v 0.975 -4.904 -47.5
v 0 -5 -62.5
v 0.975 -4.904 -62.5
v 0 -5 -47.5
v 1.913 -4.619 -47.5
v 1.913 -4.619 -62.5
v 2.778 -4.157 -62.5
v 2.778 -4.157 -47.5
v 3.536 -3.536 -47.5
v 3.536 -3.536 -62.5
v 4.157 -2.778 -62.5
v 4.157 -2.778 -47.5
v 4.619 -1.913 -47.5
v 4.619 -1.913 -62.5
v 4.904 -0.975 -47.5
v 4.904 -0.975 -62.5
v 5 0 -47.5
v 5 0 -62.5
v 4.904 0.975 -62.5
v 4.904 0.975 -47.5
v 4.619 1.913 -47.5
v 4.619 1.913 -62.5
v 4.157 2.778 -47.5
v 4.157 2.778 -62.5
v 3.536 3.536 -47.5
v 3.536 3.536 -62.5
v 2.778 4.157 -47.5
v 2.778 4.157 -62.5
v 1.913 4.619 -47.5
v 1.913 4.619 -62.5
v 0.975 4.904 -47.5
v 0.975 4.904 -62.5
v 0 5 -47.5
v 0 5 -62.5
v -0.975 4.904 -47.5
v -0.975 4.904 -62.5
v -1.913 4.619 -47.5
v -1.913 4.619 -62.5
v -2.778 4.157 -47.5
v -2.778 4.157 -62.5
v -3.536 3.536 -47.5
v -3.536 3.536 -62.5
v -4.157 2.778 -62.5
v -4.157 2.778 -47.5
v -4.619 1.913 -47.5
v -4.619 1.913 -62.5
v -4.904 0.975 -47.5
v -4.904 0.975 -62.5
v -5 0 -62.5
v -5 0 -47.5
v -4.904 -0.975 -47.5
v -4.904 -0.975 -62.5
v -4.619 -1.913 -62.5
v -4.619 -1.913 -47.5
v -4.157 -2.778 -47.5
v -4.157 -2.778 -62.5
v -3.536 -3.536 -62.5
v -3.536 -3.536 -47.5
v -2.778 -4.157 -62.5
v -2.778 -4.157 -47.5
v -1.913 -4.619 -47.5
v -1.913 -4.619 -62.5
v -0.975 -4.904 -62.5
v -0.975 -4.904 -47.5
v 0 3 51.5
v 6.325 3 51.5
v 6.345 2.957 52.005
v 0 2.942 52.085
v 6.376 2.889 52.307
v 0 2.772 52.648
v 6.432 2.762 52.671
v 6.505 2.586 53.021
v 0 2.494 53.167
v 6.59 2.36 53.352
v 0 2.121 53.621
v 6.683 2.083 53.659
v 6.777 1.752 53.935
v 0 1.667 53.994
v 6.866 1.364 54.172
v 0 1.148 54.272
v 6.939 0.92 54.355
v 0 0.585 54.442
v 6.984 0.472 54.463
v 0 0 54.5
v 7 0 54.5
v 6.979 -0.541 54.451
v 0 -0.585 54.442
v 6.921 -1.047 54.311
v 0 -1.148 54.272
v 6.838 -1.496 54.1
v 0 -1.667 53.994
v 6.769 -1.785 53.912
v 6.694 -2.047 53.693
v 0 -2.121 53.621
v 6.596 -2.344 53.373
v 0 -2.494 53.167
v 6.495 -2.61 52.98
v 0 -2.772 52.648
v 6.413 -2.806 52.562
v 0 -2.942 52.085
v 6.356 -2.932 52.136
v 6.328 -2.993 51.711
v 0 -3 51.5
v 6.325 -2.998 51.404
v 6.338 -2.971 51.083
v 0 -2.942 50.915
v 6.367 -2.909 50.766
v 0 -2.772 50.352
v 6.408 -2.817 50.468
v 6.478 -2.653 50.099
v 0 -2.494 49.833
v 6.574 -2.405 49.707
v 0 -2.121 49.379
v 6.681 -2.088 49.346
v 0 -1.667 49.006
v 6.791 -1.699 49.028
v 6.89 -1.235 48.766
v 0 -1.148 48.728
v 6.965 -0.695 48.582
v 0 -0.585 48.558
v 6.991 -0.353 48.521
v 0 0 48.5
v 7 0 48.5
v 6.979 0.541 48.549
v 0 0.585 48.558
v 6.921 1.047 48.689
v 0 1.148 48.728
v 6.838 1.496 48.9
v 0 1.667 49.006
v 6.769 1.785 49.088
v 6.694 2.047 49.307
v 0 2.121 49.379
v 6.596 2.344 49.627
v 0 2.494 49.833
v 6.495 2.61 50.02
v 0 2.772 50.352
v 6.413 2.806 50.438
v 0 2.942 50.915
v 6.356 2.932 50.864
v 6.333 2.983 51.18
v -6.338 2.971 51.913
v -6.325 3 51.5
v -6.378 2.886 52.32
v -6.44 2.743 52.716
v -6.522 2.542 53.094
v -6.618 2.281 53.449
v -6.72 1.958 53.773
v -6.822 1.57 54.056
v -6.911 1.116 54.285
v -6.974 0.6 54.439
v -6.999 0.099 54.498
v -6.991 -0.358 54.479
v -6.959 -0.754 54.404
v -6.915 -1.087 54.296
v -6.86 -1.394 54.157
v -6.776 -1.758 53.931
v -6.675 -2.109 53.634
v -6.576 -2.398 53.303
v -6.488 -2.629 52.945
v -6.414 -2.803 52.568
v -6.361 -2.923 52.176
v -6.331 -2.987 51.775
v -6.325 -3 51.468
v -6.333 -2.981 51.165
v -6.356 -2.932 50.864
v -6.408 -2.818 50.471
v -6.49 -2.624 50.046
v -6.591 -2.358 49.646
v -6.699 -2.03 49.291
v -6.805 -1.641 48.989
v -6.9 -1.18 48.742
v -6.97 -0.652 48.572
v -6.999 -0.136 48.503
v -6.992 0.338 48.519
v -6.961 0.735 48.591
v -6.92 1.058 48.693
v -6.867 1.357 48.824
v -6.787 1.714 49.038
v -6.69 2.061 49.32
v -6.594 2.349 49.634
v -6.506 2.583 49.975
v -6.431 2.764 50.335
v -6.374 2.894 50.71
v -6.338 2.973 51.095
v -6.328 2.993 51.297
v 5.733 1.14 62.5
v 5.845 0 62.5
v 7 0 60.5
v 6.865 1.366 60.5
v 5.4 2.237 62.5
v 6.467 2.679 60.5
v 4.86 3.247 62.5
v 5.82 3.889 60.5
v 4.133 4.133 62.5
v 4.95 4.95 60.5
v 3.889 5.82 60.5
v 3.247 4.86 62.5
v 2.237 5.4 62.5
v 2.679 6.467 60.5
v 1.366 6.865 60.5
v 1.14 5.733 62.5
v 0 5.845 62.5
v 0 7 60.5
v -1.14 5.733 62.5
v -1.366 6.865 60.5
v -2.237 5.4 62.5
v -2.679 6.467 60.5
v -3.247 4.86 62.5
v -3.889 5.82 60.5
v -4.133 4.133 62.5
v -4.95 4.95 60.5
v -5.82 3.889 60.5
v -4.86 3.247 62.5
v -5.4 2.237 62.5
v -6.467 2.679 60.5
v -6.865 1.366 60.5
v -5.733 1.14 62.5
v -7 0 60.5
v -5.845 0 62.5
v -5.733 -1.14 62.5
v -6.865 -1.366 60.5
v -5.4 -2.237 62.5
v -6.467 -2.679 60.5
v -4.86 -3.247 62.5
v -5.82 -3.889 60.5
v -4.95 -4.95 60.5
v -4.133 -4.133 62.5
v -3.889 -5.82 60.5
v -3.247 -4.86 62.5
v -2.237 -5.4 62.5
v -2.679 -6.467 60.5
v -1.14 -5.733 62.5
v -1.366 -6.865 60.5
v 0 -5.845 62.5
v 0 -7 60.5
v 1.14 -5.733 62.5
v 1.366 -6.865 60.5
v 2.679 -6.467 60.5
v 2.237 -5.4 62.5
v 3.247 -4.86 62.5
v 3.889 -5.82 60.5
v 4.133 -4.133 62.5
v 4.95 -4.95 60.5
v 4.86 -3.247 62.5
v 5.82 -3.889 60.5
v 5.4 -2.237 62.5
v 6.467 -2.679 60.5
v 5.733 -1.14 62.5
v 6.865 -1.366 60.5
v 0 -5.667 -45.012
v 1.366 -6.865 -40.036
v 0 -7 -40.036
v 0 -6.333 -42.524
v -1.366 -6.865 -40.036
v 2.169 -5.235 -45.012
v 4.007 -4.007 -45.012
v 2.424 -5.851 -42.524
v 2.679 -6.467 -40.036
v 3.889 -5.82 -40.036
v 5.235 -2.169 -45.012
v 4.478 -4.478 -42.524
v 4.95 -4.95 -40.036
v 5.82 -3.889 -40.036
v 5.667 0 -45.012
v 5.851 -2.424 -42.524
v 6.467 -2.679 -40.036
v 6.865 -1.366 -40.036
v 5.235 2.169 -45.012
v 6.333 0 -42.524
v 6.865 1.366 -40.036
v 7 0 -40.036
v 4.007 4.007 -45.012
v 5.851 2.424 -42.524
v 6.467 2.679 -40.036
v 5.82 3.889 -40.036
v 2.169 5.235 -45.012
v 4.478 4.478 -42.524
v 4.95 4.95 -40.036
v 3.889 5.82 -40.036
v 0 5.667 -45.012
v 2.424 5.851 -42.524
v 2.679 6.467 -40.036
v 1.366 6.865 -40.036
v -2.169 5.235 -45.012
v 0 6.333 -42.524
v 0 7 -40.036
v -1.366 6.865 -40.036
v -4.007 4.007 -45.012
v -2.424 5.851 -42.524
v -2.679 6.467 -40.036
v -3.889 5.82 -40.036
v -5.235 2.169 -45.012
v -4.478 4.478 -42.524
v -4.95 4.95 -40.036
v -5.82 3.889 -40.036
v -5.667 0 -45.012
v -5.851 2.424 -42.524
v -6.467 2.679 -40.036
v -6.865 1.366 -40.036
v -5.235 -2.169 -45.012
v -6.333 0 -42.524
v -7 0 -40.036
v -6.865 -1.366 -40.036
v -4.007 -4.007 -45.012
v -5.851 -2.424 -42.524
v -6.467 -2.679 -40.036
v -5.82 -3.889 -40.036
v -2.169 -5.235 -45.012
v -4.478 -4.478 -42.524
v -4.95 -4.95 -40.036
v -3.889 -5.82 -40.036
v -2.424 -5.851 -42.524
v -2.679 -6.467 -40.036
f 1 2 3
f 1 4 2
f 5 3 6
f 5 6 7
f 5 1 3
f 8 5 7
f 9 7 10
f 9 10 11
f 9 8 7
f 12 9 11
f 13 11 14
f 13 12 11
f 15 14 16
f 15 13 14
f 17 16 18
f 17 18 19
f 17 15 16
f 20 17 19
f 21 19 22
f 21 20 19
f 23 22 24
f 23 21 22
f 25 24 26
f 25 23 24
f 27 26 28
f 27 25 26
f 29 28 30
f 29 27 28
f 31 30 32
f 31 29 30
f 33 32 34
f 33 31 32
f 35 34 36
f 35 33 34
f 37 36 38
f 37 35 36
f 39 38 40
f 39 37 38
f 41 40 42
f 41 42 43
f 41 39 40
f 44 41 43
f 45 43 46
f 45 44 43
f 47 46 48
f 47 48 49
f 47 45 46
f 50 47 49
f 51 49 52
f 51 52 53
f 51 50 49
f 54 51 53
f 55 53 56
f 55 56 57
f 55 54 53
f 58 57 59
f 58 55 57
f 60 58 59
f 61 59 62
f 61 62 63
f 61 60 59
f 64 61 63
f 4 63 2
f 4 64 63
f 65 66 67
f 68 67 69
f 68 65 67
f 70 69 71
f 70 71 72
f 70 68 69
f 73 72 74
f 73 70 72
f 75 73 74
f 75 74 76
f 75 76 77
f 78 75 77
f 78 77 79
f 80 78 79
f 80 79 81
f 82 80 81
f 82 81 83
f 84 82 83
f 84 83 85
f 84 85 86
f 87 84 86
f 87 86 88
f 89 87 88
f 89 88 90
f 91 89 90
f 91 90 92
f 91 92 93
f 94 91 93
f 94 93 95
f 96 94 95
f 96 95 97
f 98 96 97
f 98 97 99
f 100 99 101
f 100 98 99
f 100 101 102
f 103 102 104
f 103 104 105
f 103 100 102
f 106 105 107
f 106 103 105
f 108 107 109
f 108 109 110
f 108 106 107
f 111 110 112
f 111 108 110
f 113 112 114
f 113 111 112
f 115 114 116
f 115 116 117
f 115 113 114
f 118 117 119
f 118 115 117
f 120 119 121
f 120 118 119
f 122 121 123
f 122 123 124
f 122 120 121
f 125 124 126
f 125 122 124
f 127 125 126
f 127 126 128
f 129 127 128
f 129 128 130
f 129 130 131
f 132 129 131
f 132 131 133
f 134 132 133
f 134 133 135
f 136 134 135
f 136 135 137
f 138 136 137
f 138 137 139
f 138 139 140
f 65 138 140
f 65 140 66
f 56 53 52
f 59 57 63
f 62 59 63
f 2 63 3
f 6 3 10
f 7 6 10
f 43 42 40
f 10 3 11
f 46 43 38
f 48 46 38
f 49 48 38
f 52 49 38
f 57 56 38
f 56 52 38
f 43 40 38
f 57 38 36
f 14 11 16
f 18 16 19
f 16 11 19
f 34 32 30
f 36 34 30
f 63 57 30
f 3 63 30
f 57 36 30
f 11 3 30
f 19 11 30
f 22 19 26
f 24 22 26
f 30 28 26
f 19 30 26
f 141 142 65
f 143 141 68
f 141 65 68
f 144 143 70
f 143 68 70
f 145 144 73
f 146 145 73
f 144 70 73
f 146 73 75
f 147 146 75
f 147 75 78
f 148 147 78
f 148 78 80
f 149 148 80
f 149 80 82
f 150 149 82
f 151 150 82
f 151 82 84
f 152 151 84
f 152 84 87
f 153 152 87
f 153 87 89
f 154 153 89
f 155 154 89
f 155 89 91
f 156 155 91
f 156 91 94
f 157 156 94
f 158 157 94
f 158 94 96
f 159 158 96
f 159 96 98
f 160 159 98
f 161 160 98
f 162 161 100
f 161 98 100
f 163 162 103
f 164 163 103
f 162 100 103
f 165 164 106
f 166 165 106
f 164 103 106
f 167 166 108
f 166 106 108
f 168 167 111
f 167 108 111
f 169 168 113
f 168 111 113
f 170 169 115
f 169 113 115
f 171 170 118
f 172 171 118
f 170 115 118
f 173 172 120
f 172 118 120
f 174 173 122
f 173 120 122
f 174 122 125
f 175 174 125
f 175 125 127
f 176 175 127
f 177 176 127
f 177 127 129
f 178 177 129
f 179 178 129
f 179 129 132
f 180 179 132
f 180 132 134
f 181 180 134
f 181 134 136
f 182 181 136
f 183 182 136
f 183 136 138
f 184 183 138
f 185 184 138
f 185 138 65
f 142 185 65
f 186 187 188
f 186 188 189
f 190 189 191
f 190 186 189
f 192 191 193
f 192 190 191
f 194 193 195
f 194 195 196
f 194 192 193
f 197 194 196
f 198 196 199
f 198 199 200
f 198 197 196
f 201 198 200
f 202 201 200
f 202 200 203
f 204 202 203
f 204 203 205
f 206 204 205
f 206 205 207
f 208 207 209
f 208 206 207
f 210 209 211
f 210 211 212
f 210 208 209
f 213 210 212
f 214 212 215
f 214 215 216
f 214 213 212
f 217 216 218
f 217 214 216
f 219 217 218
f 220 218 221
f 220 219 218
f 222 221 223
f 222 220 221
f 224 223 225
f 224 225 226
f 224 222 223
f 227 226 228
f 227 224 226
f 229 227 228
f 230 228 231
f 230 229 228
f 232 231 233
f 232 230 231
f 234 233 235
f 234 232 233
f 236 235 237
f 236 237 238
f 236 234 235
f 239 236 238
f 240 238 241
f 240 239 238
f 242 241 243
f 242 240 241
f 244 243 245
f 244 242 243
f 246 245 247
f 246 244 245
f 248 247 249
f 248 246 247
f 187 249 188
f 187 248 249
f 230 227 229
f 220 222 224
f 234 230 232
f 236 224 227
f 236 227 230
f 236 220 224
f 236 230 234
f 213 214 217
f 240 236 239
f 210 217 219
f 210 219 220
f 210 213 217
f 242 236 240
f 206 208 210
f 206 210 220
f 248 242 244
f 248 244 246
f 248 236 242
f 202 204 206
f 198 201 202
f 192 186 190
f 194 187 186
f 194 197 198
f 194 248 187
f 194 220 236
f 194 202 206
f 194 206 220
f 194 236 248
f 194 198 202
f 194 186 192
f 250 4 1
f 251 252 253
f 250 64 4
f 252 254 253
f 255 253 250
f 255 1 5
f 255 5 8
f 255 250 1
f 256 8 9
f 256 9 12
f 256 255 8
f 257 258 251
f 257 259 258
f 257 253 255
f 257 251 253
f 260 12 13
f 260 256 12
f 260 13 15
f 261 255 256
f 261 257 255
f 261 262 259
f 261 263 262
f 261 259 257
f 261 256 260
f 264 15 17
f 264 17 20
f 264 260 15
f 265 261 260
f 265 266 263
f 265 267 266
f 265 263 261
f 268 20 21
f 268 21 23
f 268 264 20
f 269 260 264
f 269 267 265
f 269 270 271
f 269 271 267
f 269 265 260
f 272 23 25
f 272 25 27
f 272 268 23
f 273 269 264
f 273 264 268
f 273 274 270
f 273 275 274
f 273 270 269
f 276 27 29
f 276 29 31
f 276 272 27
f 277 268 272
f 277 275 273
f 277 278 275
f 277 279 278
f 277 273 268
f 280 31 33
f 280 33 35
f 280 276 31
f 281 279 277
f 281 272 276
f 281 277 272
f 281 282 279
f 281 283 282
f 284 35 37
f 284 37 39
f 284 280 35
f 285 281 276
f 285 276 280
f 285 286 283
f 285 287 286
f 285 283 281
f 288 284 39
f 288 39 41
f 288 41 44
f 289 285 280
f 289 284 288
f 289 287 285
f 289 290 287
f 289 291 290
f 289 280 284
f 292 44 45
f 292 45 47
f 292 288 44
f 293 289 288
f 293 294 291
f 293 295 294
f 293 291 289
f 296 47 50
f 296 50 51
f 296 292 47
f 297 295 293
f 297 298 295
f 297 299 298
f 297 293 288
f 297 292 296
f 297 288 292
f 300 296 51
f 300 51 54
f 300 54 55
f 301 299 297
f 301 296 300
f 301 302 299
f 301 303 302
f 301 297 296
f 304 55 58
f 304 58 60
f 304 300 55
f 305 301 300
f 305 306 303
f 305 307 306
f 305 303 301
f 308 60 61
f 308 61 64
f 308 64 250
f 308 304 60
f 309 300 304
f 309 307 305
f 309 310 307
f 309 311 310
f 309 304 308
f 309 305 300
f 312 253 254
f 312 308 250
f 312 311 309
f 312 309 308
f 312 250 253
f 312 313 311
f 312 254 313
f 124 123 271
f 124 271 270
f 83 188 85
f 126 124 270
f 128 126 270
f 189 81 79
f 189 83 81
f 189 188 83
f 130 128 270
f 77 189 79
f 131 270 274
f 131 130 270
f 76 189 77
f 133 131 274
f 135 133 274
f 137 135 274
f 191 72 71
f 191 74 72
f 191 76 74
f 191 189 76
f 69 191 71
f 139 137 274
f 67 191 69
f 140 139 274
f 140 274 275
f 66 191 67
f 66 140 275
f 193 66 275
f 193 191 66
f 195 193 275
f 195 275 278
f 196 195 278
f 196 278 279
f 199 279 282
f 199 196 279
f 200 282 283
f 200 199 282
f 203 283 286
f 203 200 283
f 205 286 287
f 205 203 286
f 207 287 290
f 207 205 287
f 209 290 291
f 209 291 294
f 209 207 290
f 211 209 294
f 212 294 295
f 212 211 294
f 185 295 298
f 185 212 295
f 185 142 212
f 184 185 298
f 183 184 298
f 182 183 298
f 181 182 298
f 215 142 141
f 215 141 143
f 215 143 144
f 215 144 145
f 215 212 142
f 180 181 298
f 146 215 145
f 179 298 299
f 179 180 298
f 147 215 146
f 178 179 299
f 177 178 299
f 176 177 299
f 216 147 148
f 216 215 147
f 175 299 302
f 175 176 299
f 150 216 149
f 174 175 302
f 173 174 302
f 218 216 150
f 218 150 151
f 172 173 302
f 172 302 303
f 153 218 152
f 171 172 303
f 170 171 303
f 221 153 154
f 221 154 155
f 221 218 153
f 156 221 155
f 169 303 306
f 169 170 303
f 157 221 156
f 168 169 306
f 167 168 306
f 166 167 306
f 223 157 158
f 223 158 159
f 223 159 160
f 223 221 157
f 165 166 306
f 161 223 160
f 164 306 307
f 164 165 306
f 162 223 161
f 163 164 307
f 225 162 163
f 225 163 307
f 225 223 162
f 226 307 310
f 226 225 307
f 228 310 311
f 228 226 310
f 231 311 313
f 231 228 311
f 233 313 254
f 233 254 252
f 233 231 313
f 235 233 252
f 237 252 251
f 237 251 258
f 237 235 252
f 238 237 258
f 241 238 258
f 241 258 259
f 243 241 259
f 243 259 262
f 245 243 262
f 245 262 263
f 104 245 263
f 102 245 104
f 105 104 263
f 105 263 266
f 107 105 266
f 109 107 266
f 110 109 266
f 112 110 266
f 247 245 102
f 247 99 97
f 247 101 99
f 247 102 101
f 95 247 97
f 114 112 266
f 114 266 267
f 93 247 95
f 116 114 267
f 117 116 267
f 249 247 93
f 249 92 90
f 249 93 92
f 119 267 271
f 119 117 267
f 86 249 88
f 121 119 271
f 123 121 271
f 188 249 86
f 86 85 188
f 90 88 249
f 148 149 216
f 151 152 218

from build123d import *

# Parameters (mm, degrees)
F0_R          = 7
F1_DEPTH      = 62.5
F2_R          = 3
F3_DEPTH      = 7.001
F3_DEPTH_BACK = 7.001
F6_SIZE2      = 1.1547005384
F6_SIZE       = 2


with BuildPart() as f1:
    # F0 (on Top) → F1 (new body, symmetric)
    with BuildSketch(Plane.XY):
        Circle(F0_R)
    extrude(amount=F1_DEPTH, both=True)

    # F2 (on Right) → F3 (cut, two sides)
    with BuildSketch(Plane.YZ) as f3_sk:
        with Locations((0, 51.5)):
            Circle(F2_R)
    extrude(amount=-F3_DEPTH, mode=Mode.SUBTRACT)
    extrude(f3_sk.sketch, amount=F3_DEPTH_BACK, mode=Mode.SUBTRACT)

    # F4 (on Right) → F5 (revolve, cut)
    with BuildSketch(Plane.YZ):
        Polygon((-5, -47.5), (-7, -40.0358983849), (-7, -62.5), (-5, -62.5), align=None)
    revolve(axis=Axis((0, 0, -51.2679491924), (0, 0, 1)), mode=Mode.SUBTRACT)

    # F6
    f6_edges = [f1.edges().sort_by_distance(p)[0] for p in [
        (-7, 0, 62.5),
    ]]
    f6_side = f1.faces().sort_by_distance((-7, 0, 11.232051))[0]
    chamfer(f6_edges, length=F6_SIZE, length2=F6_SIZE2, reference=f6_side)


solid = f1.part
